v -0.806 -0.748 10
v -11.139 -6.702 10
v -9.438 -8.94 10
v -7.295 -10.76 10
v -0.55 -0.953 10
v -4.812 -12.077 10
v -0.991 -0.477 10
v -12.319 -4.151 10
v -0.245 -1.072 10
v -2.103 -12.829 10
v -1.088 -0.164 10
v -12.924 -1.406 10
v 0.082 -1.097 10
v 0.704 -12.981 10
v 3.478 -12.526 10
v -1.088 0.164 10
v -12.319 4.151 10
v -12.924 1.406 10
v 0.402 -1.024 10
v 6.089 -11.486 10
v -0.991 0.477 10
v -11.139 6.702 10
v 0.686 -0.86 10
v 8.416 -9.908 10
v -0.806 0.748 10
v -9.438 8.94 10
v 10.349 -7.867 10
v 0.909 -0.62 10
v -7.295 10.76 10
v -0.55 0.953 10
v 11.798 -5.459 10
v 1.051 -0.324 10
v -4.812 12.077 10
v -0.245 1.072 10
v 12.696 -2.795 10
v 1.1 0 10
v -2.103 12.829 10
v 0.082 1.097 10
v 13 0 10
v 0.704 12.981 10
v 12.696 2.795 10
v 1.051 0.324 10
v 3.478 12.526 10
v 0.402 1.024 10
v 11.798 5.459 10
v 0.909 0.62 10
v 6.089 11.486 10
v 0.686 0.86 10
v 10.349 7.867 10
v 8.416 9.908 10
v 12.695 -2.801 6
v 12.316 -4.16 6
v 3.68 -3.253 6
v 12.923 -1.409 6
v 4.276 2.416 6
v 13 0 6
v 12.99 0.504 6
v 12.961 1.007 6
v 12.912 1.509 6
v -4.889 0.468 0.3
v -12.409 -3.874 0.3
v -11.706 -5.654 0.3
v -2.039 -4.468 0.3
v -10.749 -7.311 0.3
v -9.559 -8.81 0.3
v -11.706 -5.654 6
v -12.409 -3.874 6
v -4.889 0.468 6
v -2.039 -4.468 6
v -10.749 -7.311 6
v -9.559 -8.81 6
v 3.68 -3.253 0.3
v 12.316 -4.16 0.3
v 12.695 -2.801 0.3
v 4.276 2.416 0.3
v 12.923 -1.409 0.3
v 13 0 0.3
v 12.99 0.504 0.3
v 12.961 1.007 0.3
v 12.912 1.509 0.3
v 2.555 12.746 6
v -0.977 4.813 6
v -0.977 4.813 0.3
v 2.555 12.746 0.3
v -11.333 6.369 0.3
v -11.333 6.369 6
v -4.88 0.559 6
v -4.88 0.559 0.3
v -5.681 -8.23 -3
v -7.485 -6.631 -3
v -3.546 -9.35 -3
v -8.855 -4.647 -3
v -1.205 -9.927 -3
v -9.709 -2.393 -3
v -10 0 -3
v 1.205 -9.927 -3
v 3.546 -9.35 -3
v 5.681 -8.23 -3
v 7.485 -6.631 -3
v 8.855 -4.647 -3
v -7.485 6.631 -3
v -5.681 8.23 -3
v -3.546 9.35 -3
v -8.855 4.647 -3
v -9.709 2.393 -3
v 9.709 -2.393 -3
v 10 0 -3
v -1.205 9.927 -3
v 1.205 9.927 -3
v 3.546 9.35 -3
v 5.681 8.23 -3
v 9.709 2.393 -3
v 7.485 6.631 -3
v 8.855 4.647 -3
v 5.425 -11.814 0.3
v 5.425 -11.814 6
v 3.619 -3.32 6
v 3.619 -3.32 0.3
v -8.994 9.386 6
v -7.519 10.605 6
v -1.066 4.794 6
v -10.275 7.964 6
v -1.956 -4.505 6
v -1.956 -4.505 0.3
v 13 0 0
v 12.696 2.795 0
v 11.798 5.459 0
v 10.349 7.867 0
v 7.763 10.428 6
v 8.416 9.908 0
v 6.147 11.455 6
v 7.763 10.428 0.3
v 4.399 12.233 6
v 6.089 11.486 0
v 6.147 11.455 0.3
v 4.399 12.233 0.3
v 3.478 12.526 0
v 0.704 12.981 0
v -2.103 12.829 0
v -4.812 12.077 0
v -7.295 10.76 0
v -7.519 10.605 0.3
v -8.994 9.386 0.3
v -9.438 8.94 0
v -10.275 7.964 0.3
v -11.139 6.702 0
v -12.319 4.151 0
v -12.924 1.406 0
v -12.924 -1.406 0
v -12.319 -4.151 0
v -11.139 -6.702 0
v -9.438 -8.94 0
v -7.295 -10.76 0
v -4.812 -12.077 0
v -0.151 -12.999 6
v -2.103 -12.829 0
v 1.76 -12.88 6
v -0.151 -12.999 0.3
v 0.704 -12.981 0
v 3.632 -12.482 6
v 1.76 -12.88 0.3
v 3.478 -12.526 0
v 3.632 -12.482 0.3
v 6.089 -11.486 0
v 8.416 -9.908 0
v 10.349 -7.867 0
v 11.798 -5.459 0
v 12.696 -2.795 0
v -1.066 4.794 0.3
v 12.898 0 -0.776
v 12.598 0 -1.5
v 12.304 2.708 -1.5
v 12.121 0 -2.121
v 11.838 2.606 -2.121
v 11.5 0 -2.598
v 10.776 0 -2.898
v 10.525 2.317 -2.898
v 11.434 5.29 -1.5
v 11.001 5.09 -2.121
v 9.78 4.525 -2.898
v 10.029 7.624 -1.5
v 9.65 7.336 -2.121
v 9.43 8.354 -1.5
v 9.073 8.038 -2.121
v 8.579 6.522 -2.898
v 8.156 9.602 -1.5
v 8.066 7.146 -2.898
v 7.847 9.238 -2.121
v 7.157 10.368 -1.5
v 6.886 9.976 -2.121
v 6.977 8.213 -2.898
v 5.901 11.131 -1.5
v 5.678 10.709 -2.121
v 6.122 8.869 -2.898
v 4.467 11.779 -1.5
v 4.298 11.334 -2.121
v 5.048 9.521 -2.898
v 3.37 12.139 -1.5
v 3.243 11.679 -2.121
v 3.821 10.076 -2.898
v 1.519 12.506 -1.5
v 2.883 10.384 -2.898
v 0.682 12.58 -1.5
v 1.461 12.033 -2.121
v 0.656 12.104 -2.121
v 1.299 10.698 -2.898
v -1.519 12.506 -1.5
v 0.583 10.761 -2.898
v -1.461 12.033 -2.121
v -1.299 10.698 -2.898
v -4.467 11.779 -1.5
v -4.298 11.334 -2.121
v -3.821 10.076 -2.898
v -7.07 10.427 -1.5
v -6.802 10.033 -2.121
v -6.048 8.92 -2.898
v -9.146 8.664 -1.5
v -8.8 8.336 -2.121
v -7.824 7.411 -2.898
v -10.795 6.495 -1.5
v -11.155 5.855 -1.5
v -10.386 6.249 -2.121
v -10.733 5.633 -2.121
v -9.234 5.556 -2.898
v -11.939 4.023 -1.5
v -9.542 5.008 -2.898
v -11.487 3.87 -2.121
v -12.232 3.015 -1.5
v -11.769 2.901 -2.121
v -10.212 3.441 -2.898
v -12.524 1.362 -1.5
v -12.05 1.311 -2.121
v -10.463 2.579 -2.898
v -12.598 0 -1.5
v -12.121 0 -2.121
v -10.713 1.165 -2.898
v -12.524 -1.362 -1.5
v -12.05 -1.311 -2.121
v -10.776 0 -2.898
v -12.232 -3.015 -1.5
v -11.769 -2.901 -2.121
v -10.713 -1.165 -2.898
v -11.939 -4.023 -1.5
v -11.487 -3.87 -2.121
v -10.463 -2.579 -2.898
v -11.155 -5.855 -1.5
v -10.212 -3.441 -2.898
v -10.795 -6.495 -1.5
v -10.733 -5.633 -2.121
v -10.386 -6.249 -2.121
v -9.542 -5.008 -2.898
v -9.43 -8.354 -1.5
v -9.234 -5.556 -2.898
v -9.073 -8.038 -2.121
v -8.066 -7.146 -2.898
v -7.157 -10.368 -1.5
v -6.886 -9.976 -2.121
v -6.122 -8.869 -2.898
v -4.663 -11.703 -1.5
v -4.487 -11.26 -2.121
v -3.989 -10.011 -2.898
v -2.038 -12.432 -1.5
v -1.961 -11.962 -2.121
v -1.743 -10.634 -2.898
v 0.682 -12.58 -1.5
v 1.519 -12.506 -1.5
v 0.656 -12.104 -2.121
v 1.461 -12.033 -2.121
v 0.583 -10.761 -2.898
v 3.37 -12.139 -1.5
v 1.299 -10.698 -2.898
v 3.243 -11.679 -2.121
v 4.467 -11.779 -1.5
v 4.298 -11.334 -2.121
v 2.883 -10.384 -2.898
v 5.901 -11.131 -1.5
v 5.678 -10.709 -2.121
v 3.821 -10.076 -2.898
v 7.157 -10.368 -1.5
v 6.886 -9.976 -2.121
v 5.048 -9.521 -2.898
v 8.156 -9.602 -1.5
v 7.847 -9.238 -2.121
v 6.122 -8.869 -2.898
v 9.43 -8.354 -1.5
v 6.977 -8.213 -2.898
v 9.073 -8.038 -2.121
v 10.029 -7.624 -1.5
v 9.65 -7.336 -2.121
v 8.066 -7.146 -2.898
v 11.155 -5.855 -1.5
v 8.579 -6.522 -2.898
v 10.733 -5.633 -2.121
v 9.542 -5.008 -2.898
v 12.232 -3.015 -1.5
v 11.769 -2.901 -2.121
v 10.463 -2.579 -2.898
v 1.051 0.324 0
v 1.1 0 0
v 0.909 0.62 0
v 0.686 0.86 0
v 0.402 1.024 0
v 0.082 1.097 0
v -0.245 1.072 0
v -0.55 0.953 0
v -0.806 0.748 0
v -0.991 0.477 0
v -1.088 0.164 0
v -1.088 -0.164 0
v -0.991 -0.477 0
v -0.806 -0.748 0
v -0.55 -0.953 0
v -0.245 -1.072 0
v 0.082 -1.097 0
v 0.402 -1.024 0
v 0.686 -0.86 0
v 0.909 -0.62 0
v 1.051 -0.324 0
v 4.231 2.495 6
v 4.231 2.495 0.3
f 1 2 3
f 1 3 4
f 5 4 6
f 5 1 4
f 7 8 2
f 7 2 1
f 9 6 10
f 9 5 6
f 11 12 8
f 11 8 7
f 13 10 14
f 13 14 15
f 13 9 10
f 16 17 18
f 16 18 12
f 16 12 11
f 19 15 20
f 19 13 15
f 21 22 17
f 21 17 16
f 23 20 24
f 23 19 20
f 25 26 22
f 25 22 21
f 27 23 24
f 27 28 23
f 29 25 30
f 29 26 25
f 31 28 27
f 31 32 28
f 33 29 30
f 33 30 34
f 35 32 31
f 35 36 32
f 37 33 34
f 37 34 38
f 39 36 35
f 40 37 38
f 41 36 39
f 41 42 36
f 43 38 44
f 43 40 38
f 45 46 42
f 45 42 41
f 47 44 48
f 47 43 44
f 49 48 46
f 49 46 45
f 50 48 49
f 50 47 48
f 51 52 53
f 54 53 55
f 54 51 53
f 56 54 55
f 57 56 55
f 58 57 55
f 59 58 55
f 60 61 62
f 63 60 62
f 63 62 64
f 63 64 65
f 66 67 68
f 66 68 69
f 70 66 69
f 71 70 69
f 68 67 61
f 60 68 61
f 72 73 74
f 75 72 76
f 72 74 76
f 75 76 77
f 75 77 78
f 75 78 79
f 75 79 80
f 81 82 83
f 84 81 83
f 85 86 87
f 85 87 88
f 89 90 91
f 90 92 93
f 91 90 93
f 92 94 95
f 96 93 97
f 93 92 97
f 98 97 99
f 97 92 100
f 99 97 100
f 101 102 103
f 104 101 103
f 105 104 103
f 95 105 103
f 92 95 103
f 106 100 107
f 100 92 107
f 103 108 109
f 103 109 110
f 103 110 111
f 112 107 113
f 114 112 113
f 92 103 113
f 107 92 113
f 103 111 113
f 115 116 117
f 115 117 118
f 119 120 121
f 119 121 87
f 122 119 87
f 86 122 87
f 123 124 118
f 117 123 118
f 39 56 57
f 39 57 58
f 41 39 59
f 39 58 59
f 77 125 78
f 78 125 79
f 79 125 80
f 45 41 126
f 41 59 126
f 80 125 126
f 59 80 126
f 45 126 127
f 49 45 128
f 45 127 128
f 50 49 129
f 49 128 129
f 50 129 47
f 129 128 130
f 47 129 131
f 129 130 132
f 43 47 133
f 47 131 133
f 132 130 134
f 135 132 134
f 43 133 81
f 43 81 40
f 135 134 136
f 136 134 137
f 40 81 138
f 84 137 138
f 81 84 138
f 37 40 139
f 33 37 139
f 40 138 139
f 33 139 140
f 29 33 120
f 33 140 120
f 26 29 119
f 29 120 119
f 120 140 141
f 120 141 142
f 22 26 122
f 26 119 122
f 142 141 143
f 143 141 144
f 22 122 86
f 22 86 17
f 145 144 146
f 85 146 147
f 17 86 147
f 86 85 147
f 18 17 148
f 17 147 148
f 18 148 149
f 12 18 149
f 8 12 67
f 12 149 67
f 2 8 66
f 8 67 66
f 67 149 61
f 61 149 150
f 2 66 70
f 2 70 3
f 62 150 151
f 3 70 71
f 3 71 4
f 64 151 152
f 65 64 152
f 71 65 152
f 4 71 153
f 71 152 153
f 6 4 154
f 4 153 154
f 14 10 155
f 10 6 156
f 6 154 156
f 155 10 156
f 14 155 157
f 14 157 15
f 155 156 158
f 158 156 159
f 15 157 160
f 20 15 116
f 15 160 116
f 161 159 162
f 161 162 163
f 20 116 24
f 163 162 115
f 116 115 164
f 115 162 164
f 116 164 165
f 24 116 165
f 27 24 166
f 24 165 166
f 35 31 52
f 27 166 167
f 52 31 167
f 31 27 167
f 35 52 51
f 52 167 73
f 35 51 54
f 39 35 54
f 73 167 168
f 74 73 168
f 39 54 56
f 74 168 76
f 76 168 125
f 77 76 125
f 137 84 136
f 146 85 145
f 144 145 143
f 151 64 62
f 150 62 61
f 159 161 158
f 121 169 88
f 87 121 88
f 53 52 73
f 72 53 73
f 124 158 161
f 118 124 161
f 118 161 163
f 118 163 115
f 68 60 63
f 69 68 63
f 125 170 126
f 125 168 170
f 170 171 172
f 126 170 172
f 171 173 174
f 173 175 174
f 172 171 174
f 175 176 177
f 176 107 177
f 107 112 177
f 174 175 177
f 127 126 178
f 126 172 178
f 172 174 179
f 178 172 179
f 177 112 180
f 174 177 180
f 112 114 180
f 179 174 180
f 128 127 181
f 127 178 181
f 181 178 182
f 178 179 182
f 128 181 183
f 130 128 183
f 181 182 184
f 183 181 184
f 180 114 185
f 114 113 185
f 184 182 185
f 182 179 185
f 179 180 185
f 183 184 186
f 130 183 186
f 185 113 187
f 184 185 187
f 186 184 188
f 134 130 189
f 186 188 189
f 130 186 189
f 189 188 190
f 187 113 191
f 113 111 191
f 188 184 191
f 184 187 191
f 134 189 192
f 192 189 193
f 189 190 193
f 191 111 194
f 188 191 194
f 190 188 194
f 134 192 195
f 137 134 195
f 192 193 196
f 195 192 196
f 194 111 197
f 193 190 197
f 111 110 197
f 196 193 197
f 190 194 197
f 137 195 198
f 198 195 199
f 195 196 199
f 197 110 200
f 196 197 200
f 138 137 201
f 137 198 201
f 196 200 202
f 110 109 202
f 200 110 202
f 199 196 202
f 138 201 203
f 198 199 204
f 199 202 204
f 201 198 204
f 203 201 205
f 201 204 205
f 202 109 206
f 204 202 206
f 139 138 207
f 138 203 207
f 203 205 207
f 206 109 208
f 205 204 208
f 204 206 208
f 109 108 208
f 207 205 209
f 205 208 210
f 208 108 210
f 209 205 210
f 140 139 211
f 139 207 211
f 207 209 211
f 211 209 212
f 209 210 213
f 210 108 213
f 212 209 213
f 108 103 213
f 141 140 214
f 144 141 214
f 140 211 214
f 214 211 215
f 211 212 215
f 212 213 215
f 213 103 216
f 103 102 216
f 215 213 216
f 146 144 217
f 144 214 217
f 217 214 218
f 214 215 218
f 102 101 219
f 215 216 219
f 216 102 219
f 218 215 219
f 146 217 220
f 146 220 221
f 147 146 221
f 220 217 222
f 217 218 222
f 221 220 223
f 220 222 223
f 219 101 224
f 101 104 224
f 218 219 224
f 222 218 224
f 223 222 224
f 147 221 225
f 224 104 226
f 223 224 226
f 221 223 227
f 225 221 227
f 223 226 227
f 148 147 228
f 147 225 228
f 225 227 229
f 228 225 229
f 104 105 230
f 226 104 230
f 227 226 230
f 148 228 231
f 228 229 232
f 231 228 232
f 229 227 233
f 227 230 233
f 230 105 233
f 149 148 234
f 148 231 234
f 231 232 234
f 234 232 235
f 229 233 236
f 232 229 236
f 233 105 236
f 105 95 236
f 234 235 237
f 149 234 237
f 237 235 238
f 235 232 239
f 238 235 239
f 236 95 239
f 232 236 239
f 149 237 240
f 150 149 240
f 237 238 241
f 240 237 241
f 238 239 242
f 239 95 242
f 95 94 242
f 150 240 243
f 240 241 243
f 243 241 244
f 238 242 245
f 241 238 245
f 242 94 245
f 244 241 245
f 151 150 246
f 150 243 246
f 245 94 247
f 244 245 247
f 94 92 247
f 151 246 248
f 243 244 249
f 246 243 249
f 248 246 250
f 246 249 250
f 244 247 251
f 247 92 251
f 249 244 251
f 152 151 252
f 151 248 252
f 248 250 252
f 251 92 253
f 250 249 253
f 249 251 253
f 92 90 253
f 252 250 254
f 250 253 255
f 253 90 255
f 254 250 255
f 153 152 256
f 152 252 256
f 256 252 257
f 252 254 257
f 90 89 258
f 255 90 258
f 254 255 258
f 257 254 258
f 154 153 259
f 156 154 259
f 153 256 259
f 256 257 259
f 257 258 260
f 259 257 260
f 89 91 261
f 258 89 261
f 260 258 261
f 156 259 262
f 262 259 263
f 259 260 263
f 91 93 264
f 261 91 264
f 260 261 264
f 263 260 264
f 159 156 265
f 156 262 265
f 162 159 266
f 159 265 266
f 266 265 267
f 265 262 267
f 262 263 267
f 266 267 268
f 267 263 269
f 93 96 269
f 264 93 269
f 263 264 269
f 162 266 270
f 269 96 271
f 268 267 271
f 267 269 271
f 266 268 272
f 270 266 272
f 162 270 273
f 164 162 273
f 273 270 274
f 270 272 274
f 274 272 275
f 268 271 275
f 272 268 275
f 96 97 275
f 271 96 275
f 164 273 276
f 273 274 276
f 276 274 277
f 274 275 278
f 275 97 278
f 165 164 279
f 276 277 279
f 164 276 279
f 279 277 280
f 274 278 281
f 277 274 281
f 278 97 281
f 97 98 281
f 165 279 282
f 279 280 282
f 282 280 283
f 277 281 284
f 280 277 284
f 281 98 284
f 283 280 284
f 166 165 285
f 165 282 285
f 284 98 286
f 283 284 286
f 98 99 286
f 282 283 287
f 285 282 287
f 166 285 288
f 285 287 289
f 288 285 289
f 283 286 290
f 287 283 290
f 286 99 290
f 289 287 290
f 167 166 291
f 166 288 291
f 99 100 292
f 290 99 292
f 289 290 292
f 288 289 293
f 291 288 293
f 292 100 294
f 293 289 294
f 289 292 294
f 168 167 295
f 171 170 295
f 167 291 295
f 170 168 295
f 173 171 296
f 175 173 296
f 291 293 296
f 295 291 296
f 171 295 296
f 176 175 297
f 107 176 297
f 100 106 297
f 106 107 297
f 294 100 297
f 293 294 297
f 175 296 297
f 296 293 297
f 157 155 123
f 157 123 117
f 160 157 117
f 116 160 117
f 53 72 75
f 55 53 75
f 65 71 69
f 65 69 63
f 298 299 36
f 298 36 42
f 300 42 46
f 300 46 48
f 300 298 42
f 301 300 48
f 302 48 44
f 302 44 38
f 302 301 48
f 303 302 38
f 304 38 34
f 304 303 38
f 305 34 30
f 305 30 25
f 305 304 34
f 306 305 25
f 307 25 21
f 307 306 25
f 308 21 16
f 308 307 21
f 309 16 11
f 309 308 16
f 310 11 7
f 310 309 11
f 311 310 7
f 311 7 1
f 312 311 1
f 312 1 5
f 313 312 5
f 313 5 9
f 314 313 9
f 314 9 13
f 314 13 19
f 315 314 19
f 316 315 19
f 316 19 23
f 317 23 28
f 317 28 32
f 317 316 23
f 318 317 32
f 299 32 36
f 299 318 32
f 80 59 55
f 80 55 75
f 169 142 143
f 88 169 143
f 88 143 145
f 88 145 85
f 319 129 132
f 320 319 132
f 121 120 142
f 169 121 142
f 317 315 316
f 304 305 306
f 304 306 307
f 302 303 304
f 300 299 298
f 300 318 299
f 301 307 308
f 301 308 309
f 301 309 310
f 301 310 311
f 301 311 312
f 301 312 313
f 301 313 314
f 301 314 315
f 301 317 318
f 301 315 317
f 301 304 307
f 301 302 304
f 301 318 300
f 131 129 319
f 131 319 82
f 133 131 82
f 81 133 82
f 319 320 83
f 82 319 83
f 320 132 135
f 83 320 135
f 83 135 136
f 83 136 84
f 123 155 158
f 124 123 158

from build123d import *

# Parameters (mm, degrees)
SKETCH1_R           = 13
SKETCH1_R_2         = 1.1
BOSS_EXTRUDE1_DEPTH = 10
BOSS_EXTRUDE2_START = -3
SKETCH1_4_R         = 13
BOSS_EXTRUDE2_DEPTH = 3
FILLET1_R           = 3
SKETCH4_W           = 5.7
SKETCH4_H           = 5.7
CUT_EXTRUDE1_DEPTH  = 9
CIRPATTERN1_COUNT   = 5


with BuildPart() as part:
    # Sketch1 → Boss-Extrude1 (new body)
    with BuildSketch(Plane.XY):
        Circle(SKETCH1_R)
        Circle(SKETCH1_R_2, mode=Mode.SUBTRACT)
    extrude(amount=BOSS_EXTRUDE1_DEPTH)

    # Sketch1<4> → Boss-Extrude2 (add)
    with BuildSketch(Plane.XY.offset(BOSS_EXTRUDE2_START)):
        Circle(SKETCH1_4_R)
    extrude(amount=BOSS_EXTRUDE2_DEPTH)

    # Fillet1
    fillet1_edges = [part.edges().sort_by_distance(p)[0] for p in [
        (-13, 0, -3),
    ]]
    fillet(fillet1_edges, radius=FILLET1_R)

    # Sketch4 → Cut-Extrude1 (cut)
    with BuildSketch(Plane(origin=(-11.286443879, -6.451305765, 0), x_dir=(0.499999999999998, -0.8660254037844398, 0), z_dir=(0.8660254037844398, 0.499999999999998, 0))):
        with Locations((0.056227259, -3.15)):
            Rectangle(SKETCH4_W, SKETCH4_H)
    cut_extrude1 = extrude(amount=CUT_EXTRUDE1_DEPTH, mode=Mode.SUBTRACT)

    # CirPattern1: Cut-Extrude1 ×5 about axis
    cirpattern1_axis = Axis((0, 0, 10), (0, 0, -1))
    for i in range(1, CIRPATTERN1_COUNT):
        add(cut_extrude1.rotate(cirpattern1_axis, i * 360 / CIRPATTERN1_COUNT), mode=Mode.SUBTRACT)


solid = part.part
